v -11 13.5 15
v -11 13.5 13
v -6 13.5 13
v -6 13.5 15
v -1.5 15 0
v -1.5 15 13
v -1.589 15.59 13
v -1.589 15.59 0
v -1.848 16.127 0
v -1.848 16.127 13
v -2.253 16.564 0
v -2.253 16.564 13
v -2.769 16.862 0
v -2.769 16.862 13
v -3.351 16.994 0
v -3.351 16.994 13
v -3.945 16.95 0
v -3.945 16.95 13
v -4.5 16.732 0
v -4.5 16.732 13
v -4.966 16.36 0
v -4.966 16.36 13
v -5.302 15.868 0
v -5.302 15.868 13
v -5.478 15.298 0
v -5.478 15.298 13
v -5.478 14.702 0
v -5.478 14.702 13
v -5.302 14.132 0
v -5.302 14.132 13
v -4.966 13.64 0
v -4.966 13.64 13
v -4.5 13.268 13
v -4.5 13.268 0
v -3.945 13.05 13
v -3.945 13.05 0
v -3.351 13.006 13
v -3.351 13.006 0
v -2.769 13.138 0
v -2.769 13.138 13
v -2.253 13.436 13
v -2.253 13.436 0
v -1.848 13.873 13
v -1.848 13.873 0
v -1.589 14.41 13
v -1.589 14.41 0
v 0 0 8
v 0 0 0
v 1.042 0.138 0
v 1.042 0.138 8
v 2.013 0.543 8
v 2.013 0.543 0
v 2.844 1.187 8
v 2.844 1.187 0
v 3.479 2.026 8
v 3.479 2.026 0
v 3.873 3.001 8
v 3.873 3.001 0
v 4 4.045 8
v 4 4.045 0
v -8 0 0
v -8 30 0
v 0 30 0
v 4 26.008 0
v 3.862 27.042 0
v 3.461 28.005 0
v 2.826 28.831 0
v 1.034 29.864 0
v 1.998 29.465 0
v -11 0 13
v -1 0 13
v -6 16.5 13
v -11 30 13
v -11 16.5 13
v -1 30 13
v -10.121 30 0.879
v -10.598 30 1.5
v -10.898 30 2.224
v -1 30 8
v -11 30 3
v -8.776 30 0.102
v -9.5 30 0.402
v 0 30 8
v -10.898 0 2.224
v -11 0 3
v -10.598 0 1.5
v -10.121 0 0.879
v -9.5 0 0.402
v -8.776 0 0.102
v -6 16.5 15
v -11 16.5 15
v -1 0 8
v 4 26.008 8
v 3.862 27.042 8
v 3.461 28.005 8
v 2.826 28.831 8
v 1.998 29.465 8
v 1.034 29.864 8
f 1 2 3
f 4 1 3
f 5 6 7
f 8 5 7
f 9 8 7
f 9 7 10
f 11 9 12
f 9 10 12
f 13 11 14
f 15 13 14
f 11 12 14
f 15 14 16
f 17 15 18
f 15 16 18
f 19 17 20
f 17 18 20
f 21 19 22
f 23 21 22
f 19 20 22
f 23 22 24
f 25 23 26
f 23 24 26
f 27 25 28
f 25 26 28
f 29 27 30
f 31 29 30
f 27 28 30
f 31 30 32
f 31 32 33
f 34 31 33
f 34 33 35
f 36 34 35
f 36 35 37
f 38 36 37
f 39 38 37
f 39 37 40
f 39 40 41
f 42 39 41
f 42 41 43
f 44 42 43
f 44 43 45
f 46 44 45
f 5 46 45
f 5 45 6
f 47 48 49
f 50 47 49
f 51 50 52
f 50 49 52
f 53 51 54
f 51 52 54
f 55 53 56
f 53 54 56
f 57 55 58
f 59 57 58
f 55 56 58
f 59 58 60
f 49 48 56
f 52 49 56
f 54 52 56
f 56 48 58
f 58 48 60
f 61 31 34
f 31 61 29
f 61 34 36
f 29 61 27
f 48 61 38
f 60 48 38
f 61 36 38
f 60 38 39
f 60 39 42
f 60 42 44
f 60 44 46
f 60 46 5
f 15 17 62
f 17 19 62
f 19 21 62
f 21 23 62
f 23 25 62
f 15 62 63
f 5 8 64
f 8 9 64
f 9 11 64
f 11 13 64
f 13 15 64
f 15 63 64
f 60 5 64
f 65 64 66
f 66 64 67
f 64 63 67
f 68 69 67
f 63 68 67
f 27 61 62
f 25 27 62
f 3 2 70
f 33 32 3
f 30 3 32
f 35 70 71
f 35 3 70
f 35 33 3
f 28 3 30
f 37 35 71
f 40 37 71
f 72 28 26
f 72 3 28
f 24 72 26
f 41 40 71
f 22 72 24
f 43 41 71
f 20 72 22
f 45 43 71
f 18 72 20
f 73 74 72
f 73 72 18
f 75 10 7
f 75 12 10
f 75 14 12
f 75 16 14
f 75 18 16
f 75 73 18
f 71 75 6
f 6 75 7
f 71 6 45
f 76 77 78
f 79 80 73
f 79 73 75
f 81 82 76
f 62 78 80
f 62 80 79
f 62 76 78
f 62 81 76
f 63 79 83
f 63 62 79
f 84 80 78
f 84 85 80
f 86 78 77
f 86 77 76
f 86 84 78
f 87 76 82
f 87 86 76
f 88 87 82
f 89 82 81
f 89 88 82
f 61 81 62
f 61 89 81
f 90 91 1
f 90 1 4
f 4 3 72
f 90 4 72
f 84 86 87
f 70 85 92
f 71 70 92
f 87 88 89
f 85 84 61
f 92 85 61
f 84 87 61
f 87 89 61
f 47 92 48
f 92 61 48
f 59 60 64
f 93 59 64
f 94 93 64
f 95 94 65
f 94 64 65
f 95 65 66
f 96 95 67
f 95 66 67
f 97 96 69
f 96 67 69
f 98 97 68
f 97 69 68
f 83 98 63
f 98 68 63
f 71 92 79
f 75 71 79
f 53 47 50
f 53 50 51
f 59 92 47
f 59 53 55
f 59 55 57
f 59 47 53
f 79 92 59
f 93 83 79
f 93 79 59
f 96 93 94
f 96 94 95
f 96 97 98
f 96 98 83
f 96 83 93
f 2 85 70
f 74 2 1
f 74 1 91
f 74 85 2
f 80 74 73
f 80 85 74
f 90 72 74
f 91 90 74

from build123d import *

# Parameters (mm, degrees)
F1_DEPTH = 8
F2_W     = 10
F2_H     = 30
F3_DEPTH = 5
F4_R     = 2
F5_DEPTH = 13.9
F6_DEPTH = 2
F7_R     = 3


with BuildPart() as f1:
    # F0 (on Top) → F1 (new body)
    with BuildSketch(Plane.XY):
        with BuildLine():
            Line((-11, 0), (0, 0))
            ThreePointArc((0, 0), (2.844279, 1.18741), (4, 4.044713))
            Line((4, 4.044713), (4, 26.008084))
            ThreePointArc((4, 26.008084), (2.82557, 28.831284), (0, 30))
            Line((0, 30), (-11, 30))
            Line((-11, 30), (-11, 0))
        make_face()
    extrude(amount=F1_DEPTH)

    # F2 (on face) → F3 (join)
    with BuildSketch(Plane.XY.offset(8)):
        with Locations((-6, 15)):
            Rectangle(F2_W, F2_H)
    extrude(amount=F3_DEPTH)

    # F4 (on face) → F5 (cut)
    with BuildSketch(Plane.XY.offset(13)):
        with Locations((-3.5, 15)):
            Circle(F4_R)
    extrude(amount=-F5_DEPTH, mode=Mode.SUBTRACT)

    # F4 (on face) → F6 (join)
    with BuildSketch(Plane.XY.offset(13)):
        Polygon((-6, 16.5), (-11, 16.5), (-11, 15), (-11, 13.5), (-6, 13.5), (-6, 15), align=None)
    extrude(amount=F6_DEPTH)

    # F7
    f7_edges = [f1.edges().sort_by_distance(p)[0] for p in [
        (-11, 15, 0),
    ]]
    fillet(f7_edges, radius=F7_R)


solid = f1.part
